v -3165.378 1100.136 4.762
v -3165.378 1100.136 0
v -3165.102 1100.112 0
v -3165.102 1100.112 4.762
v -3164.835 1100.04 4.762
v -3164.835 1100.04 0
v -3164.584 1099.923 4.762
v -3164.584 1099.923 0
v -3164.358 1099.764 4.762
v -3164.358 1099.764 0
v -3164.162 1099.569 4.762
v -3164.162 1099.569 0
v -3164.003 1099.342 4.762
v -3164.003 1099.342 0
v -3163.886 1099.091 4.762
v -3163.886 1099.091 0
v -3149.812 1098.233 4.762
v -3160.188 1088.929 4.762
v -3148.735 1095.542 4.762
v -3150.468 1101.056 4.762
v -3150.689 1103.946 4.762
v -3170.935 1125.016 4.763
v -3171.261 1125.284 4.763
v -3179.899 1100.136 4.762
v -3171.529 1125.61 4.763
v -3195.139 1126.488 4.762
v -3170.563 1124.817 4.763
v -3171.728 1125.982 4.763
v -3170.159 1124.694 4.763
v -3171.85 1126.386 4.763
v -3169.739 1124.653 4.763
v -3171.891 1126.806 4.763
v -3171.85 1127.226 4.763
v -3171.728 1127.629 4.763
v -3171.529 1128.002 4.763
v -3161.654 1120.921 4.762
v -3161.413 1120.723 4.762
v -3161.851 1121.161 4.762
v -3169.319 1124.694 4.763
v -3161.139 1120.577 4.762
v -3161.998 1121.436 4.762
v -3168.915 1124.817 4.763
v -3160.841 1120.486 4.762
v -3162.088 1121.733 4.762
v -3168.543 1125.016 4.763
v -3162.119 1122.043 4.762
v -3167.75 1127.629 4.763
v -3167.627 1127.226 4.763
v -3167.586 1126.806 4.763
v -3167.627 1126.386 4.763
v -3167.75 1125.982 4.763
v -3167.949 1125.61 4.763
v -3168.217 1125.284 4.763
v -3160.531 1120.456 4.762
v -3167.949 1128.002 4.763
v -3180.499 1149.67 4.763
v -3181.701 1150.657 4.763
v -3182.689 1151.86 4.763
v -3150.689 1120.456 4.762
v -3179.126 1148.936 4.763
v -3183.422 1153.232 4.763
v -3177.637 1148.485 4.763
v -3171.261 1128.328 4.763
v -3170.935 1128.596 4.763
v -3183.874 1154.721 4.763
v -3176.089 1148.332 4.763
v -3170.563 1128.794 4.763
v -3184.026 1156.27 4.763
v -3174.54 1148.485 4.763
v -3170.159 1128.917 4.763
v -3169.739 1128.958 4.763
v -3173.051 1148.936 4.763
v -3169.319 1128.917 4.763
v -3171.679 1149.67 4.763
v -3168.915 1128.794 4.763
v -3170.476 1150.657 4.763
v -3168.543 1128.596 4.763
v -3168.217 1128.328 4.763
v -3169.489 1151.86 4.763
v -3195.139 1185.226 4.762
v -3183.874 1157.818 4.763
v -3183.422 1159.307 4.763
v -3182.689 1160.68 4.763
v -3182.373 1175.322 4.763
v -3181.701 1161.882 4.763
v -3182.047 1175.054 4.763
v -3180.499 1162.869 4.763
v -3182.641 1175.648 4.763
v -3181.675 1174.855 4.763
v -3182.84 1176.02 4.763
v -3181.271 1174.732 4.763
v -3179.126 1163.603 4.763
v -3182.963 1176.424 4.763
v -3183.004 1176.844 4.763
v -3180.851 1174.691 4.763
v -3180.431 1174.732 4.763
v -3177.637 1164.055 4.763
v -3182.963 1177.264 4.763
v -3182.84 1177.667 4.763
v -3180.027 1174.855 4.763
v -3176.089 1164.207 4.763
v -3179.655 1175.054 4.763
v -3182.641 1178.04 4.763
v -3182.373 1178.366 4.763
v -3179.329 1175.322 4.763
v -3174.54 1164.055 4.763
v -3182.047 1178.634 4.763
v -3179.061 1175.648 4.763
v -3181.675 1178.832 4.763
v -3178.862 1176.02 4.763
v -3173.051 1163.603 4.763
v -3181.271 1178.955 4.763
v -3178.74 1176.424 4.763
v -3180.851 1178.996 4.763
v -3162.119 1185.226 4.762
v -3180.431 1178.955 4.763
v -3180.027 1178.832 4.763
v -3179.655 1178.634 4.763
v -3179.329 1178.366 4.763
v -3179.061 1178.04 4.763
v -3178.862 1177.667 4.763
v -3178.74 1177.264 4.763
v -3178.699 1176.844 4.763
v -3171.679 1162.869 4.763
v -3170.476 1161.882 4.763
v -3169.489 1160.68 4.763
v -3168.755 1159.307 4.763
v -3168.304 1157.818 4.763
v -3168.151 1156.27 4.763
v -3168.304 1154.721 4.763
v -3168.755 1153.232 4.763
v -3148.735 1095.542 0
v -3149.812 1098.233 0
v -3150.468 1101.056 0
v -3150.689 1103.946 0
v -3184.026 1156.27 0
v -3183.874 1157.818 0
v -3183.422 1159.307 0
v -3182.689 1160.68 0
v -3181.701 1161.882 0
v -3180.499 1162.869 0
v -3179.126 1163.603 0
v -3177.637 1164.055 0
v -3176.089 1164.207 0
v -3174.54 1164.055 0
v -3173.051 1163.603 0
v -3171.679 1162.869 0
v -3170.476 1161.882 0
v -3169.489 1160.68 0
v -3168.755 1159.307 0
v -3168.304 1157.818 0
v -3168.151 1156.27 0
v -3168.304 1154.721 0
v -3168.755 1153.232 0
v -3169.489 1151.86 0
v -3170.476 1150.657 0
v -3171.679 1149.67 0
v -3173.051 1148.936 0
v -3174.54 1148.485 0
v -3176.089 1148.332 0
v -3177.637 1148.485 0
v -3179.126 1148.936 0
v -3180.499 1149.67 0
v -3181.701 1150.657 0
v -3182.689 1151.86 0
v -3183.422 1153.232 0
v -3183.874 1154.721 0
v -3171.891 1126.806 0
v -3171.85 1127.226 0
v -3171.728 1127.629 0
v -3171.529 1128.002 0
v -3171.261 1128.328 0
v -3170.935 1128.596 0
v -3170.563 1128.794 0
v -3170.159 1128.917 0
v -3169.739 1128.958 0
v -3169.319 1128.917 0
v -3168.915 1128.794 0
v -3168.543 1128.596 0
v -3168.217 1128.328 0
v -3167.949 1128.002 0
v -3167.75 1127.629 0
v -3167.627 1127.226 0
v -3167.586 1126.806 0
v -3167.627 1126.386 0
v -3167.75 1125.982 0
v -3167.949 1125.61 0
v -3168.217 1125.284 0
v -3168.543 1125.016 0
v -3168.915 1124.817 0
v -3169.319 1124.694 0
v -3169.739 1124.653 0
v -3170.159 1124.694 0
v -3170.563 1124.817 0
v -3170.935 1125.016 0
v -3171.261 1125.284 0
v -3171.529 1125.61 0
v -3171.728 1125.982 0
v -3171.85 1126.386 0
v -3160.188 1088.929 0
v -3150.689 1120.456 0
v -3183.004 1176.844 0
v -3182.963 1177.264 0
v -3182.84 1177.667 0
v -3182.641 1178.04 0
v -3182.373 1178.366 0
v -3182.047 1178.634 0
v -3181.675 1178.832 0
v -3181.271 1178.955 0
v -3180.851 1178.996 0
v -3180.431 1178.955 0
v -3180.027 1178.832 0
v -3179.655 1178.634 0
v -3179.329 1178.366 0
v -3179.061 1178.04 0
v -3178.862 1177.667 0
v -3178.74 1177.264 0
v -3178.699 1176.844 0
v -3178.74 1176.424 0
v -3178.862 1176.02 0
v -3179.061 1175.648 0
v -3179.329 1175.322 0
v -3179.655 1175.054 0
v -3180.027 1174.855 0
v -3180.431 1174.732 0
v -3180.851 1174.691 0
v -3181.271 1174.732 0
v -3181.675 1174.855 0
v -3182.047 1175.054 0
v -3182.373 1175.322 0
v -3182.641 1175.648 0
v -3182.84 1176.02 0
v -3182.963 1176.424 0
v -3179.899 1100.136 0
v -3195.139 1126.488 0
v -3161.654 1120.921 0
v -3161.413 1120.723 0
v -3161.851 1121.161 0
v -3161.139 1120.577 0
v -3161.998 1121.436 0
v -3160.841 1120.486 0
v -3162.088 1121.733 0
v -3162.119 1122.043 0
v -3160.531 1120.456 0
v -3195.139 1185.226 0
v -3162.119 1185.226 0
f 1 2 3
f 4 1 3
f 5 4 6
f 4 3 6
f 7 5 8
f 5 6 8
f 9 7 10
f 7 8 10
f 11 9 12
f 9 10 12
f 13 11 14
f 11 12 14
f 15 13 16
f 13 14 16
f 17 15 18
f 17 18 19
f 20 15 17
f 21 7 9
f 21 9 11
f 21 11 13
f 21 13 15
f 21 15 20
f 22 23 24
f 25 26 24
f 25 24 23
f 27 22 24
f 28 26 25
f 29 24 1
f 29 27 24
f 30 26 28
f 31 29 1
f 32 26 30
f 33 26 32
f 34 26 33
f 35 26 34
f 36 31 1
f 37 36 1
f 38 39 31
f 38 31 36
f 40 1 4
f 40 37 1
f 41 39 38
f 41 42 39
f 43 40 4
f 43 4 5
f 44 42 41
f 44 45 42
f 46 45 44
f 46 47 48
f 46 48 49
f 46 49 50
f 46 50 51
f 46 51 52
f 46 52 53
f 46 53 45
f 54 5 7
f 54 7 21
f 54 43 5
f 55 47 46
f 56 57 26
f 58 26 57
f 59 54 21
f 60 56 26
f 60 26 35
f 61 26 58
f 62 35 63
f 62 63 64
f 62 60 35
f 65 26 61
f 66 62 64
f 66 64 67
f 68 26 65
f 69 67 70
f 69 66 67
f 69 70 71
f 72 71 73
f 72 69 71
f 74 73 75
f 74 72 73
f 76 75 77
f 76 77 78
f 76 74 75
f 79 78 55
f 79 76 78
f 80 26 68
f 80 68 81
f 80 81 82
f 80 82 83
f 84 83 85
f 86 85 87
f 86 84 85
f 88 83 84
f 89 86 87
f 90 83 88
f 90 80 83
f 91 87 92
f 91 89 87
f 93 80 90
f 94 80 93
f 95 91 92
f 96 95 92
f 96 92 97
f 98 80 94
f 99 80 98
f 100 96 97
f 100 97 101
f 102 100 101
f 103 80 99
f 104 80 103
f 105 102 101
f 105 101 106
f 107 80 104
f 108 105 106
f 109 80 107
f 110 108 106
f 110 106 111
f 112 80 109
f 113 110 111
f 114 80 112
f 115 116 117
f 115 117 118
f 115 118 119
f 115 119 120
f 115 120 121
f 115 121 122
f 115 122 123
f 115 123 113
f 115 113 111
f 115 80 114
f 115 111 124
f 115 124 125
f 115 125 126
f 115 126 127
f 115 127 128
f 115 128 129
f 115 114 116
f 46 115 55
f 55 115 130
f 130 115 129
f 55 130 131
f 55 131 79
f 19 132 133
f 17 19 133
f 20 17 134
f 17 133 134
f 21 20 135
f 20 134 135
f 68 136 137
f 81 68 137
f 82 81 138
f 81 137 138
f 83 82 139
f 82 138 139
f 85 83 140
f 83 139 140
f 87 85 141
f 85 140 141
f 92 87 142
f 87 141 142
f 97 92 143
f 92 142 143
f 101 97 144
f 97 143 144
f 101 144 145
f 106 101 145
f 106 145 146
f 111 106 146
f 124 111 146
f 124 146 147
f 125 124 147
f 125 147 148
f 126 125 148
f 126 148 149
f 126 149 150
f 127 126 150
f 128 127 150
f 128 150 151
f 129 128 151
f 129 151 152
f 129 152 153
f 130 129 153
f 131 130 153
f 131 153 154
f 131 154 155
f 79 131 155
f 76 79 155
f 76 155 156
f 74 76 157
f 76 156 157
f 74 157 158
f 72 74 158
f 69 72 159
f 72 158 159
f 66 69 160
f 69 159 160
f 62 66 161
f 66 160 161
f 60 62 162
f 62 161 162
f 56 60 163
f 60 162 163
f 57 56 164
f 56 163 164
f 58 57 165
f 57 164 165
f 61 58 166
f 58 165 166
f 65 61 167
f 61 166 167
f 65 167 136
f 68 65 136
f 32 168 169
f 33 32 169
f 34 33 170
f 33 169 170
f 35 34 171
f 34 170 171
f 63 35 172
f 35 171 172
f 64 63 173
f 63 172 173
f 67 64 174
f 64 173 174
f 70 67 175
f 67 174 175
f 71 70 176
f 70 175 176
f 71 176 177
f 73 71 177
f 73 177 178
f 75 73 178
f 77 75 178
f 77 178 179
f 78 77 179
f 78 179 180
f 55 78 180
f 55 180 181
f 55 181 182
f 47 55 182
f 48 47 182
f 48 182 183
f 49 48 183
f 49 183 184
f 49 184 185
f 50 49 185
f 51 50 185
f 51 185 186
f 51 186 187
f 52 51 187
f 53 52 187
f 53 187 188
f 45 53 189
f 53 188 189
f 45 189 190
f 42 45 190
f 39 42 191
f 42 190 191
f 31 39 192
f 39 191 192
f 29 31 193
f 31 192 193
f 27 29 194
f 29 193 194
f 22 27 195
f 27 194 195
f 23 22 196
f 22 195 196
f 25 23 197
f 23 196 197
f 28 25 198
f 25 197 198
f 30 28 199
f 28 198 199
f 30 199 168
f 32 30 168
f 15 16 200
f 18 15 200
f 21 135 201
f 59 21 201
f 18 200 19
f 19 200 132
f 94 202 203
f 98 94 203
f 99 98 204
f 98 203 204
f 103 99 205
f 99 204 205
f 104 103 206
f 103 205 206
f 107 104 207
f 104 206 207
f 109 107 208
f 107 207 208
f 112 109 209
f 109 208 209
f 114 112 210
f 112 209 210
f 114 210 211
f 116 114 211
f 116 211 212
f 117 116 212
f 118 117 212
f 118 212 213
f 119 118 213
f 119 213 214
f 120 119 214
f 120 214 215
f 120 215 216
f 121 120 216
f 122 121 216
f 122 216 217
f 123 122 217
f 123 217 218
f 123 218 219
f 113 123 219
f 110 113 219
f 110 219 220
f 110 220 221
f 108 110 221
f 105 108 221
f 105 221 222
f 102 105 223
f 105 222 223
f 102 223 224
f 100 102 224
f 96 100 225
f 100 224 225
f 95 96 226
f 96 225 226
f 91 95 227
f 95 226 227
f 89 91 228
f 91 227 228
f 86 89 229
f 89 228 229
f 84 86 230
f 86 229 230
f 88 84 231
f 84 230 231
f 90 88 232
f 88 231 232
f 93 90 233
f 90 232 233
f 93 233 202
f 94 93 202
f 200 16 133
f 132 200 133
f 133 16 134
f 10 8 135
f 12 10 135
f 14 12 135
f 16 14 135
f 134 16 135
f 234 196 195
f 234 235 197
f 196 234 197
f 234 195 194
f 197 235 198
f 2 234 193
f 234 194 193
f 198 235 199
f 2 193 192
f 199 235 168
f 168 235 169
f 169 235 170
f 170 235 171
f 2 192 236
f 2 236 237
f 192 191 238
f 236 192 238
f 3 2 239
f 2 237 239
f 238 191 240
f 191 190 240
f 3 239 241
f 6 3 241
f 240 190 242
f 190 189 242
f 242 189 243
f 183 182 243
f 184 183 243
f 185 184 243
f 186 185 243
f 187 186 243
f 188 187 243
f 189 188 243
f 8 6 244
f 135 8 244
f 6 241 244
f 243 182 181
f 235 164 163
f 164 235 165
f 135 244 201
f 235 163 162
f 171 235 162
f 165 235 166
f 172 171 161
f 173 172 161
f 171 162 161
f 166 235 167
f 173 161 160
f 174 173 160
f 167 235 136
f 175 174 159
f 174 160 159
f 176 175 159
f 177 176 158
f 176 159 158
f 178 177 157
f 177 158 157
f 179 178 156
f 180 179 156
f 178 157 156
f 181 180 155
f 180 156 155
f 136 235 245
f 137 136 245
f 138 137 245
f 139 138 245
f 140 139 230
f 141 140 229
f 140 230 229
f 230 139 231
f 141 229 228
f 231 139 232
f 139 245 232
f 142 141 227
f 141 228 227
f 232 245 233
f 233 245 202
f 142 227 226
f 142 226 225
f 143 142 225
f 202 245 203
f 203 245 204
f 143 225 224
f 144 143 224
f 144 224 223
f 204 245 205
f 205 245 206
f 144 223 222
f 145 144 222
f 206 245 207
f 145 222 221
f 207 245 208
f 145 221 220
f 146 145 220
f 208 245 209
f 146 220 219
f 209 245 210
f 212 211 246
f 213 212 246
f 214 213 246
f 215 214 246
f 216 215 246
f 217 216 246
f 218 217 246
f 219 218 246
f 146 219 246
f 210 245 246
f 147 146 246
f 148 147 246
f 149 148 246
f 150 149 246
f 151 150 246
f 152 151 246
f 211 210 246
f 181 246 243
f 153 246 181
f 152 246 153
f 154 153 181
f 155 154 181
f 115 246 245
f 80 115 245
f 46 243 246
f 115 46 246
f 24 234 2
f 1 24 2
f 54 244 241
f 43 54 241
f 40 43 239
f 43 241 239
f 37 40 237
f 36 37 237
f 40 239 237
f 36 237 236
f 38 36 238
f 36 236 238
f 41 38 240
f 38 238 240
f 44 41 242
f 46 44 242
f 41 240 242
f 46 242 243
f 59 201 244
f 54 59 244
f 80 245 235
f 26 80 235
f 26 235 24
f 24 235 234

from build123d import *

# Parameters (mm, degrees)
BOSS_EXTRUDE1_DEPTH          = 4.7625
F_6_CLEARANCE_HOLE1_D        = 4.3053
F_5_8_0_625_DIAMETER_HOLE1_D = 15.875


with BuildPart() as part:
    # Sketch1 → Boss-Extrude1 (new body)
    with BuildSketch(Plane.XY):
        with BuildLine():
            Line((-3163.88635614, 1099.09115169), (-3160.187774322, 1088.929381663))
            Line((-3160.187774322, 1088.929381663), (-3148.734838552, 1095.541737213))
            ThreePointArc((-3148.734838552, 1095.541737213), (-3150.193848799, 1099.631639206), (-3150.688757178, 1103.945694712))
            Line((-3150.688757178, 1103.945694712), (-3150.688757178, 1120.455694712))
            Line((-3150.688757178, 1120.455694712), (-3160.531257178, 1120.455694712))
            ThreePointArc((-3160.531257178, 1120.455694712), (-3161.653789193, 1120.920662697), (-3162.118757178, 1122.043194712))
            Line((-3162.118757178, 1122.043194712), (-3162.118757178, 1185.225694712))
            Line((-3162.118757178, 1185.225694712), (-3195.138757178, 1185.225694712))
            Line((-3195.138757178, 1185.225694712), (-3195.138757178, 1126.488194712))
            Line((-3195.138757178, 1126.488194712), (-3179.898757178, 1100.135694712))
            Line((-3179.898757178, 1100.135694712), (-3165.378118175, 1100.135694712))
            ThreePointArc((-3165.378118175, 1100.135694712), (-3164.467565582, 1099.848598583), (-3163.88635614, 1099.09115169))
        make_face()
    extrude(amount=BOSS_EXTRUDE1_DEPTH)

    # #6 Clearance Hole1 (through all)
    with Locations(Plane.XY.offset(4.7625)):
        with Locations((-3169.738757178, 1126.805694712), (-3180.851257178, 1176.843694712)):
            Hole(F_6_CLEARANCE_HOLE1_D / 2)

    # 5/8 (0.625) Diameter Hole1 (through all)
    with Locations(Plane.XY.offset(4.7625)):
        with Locations((-3176.088757178, 1156.269694712)):
            Hole(F_5_8_0_625_DIAMETER_HOLE1_D / 2)


solid = part.part
